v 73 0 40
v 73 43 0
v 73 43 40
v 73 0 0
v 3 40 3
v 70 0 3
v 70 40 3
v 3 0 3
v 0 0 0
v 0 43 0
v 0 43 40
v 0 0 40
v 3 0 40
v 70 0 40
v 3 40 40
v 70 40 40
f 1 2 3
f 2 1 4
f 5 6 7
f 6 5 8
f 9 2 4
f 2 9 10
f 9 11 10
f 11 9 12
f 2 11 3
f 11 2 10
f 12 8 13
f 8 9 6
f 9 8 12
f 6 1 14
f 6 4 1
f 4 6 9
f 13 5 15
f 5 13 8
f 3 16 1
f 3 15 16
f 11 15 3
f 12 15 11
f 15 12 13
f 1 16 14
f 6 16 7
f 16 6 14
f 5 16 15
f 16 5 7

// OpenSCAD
// file: parts/case_body.scad
// Single-piece rectangular case with an open top and no front wall.

function case_outer_width() = interior_width + 2 * wall_thickness;
function case_outer_depth() = interior_depth + 2 * wall_thickness;
function case_outer_height() = interior_height + floor_thickness;
function back_wall_y() = wall_thickness + interior_depth;
function microsd_center_y() = case_outer_depth() - microsd_center_from_back_outer_edge;
function microsd_center_z() = floor_thickness + microsd_center_above_internal_floor;
function microsd_min_y() = microsd_center_y() - microsd_opening_width / 2;
function microsd_max_y() = microsd_center_y() + microsd_opening_width / 2;
function microsd_min_z() = microsd_center_z() - microsd_opening_height / 2;
function microsd_max_z() = microsd_center_z() + microsd_opening_height / 2;
function microsd_front_margin() = microsd_min_y();
function microsd_back_margin() = case_outer_depth() - microsd_max_y();
function microsd_floor_ligament() = microsd_min_z() - floor_thickness;
function microsd_top_margin() = case_outer_height() - microsd_max_z();

module _assert_case_dimensions() {
  assert(interior_width > 0 && interior_depth > 0 && interior_height > 0,
    "Interior dimensions must be positive.");
  assert(wall_thickness >= minimum_wall_thickness,
    "Wall thickness is below the minimum wall thickness.");
  assert(floor_thickness >= minimum_wall_thickness,
    "Floor thickness is below the minimum wall thickness.");
  assert(minimum_structural_overlap >= minimum_wall_thickness,
    "Structural overlap must be at least the minimum wall thickness.");
  assert(minimum_internal_edge_width >= minimum_wall_thickness,
    "Internal edges and material strips must be at least the minimum wall thickness.");
  assert(wall_floor_overlap >= minimum_structural_overlap,
    "Walls do not engage the floor by the minimum structural overlap.");
  assert(rear_corner_overlap >= minimum_structural_overlap,
    "Rear wall corners do not have the minimum structural overlap.");
  assert(front_floor_apron_depth >= minimum_internal_edge_width,
    "The floor apron at the omitted front wall is too narrow.");
  assert(case_outer_width() > interior_width && case_outer_depth() > interior_depth,
    "Exterior dimensions must contain the nominal interior envelope.");
  assert(case_outer_height() > interior_height,
    "Exterior height must contain the nominal interior height above the floor.");
  assert(microsd_opening_width > 0 && microsd_opening_height > 0,
    "microSD opening dimensions must be positive.");
  assert(boolean_epsilon > 0 && boolean_epsilon < wall_thickness,
    "Boolean epsilon must be positive and smaller than the wall thickness.");
  assert(microsd_center_from_back_outer_edge > microsd_opening_width / 2,
    "microSD opening extends beyond the outer back edge.");
  assert(microsd_center_above_internal_floor > microsd_opening_height / 2,
    "microSD opening extends into the internal floor.");
  assert(microsd_front_margin() >= minimum_internal_edge_width,
    "microSD opening leaves too little material to the outer front edge.");
  assert(microsd_back_margin() >= minimum_internal_edge_width,
    "microSD opening leaves too little material to the outer back edge.");
  assert(microsd_floor_ligament() >= minimum_internal_edge_width,
    "microSD opening leaves too little wall material above the internal floor.");
  assert(microsd_top_margin() >= minimum_internal_edge_width,
    "microSD opening leaves too little wall material below the rim.");
}

module _case_floor() {
  cube([case_outer_width(), case_outer_depth(), floor_thickness]);
}

module _left_wall() {
  cube([wall_thickness, case_outer_depth(), case_outer_height()]);
}

module _right_wall() {
  translate([case_outer_width() - wall_thickness, 0, 0])
    cube([wall_thickness, case_outer_depth(), case_outer_height()]);
}

module _back_wall() {
  translate([0, back_wall_y(), 0])
    cube([case_outer_width(), wall_thickness, case_outer_height()]);
}

module _case_positive() {
  union() {
    _case_floor();
    _left_wall();
    _right_wall();
    _back_wall();
  }
}

module _microsd_opening_cut() {
  translate([-boolean_epsilon, microsd_min_y(), microsd_min_z()])
    cube([
      wall_thickness + 2 * boolean_epsilon,
      microsd_opening_width,
      microsd_opening_height
    ]);
}

module micro_cyberdeck_case_body() {
  _assert_case_dimensions();
  difference() {
    _case_positive();
    if (microsd_opening_enabled) {
      _microsd_opening_cut();
    }
  }
}
// file: lib/defaults.scad
// Micro cyberdeck open-front case defaults, in millimeters.
// Coordinate datum: outer-front-left-bottom corner is [0, 0, 0].

part_id = is_undef(part_id) ? 0 : part_id;

interior_width = is_undef(interior_width) ? 67.0 : interior_width;
interior_depth = is_undef(interior_depth) ? 37.0 : interior_depth;
interior_height = is_undef(interior_height) ? 37.0 : interior_height;

wall_thickness = is_undef(wall_thickness) ? 3.0 : wall_thickness;
floor_thickness = is_undef(floor_thickness) ? 3.0 : floor_thickness;

microsd_opening_enabled = is_undef(microsd_opening_enabled) ? false : microsd_opening_enabled;
microsd_opening_width = is_undef(microsd_opening_width) ? 15.0 : microsd_opening_width;
microsd_opening_height = is_undef(microsd_opening_height) ? 10.0 : microsd_opening_height;
microsd_center_above_internal_floor = is_undef(microsd_center_above_internal_floor) ? 12.0 : microsd_center_above_internal_floor;
microsd_center_from_back_outer_edge = is_undef(microsd_center_from_back_outer_edge) ? 22.0 : microsd_center_from_back_outer_edge;
boolean_epsilon = is_undef(boolean_epsilon) ? 0.01 : boolean_epsilon;

minimum_wall_thickness = is_undef(minimum_wall_thickness) ? 3.0 : minimum_wall_thickness;
minimum_structural_overlap = is_undef(minimum_structural_overlap) ? minimum_wall_thickness : minimum_structural_overlap;
minimum_internal_edge_width = is_undef(minimum_internal_edge_width) ? minimum_wall_thickness : minimum_internal_edge_width;

wall_floor_overlap = floor_thickness;
rear_corner_overlap = wall_thickness;
front_floor_apron_depth = wall_thickness;
// main file
// Scripted export entrypoint for the micro cyberdeck open-front case.
// part_id map: 0 = printable case body.

include <lib/defaults.scad>;
include <parts/case_body.scad>;

if (part_id == 0) {
  micro_cyberdeck_case_body();
} else {
  assert(false, str("Unknown part_id: ", part_id));
}
